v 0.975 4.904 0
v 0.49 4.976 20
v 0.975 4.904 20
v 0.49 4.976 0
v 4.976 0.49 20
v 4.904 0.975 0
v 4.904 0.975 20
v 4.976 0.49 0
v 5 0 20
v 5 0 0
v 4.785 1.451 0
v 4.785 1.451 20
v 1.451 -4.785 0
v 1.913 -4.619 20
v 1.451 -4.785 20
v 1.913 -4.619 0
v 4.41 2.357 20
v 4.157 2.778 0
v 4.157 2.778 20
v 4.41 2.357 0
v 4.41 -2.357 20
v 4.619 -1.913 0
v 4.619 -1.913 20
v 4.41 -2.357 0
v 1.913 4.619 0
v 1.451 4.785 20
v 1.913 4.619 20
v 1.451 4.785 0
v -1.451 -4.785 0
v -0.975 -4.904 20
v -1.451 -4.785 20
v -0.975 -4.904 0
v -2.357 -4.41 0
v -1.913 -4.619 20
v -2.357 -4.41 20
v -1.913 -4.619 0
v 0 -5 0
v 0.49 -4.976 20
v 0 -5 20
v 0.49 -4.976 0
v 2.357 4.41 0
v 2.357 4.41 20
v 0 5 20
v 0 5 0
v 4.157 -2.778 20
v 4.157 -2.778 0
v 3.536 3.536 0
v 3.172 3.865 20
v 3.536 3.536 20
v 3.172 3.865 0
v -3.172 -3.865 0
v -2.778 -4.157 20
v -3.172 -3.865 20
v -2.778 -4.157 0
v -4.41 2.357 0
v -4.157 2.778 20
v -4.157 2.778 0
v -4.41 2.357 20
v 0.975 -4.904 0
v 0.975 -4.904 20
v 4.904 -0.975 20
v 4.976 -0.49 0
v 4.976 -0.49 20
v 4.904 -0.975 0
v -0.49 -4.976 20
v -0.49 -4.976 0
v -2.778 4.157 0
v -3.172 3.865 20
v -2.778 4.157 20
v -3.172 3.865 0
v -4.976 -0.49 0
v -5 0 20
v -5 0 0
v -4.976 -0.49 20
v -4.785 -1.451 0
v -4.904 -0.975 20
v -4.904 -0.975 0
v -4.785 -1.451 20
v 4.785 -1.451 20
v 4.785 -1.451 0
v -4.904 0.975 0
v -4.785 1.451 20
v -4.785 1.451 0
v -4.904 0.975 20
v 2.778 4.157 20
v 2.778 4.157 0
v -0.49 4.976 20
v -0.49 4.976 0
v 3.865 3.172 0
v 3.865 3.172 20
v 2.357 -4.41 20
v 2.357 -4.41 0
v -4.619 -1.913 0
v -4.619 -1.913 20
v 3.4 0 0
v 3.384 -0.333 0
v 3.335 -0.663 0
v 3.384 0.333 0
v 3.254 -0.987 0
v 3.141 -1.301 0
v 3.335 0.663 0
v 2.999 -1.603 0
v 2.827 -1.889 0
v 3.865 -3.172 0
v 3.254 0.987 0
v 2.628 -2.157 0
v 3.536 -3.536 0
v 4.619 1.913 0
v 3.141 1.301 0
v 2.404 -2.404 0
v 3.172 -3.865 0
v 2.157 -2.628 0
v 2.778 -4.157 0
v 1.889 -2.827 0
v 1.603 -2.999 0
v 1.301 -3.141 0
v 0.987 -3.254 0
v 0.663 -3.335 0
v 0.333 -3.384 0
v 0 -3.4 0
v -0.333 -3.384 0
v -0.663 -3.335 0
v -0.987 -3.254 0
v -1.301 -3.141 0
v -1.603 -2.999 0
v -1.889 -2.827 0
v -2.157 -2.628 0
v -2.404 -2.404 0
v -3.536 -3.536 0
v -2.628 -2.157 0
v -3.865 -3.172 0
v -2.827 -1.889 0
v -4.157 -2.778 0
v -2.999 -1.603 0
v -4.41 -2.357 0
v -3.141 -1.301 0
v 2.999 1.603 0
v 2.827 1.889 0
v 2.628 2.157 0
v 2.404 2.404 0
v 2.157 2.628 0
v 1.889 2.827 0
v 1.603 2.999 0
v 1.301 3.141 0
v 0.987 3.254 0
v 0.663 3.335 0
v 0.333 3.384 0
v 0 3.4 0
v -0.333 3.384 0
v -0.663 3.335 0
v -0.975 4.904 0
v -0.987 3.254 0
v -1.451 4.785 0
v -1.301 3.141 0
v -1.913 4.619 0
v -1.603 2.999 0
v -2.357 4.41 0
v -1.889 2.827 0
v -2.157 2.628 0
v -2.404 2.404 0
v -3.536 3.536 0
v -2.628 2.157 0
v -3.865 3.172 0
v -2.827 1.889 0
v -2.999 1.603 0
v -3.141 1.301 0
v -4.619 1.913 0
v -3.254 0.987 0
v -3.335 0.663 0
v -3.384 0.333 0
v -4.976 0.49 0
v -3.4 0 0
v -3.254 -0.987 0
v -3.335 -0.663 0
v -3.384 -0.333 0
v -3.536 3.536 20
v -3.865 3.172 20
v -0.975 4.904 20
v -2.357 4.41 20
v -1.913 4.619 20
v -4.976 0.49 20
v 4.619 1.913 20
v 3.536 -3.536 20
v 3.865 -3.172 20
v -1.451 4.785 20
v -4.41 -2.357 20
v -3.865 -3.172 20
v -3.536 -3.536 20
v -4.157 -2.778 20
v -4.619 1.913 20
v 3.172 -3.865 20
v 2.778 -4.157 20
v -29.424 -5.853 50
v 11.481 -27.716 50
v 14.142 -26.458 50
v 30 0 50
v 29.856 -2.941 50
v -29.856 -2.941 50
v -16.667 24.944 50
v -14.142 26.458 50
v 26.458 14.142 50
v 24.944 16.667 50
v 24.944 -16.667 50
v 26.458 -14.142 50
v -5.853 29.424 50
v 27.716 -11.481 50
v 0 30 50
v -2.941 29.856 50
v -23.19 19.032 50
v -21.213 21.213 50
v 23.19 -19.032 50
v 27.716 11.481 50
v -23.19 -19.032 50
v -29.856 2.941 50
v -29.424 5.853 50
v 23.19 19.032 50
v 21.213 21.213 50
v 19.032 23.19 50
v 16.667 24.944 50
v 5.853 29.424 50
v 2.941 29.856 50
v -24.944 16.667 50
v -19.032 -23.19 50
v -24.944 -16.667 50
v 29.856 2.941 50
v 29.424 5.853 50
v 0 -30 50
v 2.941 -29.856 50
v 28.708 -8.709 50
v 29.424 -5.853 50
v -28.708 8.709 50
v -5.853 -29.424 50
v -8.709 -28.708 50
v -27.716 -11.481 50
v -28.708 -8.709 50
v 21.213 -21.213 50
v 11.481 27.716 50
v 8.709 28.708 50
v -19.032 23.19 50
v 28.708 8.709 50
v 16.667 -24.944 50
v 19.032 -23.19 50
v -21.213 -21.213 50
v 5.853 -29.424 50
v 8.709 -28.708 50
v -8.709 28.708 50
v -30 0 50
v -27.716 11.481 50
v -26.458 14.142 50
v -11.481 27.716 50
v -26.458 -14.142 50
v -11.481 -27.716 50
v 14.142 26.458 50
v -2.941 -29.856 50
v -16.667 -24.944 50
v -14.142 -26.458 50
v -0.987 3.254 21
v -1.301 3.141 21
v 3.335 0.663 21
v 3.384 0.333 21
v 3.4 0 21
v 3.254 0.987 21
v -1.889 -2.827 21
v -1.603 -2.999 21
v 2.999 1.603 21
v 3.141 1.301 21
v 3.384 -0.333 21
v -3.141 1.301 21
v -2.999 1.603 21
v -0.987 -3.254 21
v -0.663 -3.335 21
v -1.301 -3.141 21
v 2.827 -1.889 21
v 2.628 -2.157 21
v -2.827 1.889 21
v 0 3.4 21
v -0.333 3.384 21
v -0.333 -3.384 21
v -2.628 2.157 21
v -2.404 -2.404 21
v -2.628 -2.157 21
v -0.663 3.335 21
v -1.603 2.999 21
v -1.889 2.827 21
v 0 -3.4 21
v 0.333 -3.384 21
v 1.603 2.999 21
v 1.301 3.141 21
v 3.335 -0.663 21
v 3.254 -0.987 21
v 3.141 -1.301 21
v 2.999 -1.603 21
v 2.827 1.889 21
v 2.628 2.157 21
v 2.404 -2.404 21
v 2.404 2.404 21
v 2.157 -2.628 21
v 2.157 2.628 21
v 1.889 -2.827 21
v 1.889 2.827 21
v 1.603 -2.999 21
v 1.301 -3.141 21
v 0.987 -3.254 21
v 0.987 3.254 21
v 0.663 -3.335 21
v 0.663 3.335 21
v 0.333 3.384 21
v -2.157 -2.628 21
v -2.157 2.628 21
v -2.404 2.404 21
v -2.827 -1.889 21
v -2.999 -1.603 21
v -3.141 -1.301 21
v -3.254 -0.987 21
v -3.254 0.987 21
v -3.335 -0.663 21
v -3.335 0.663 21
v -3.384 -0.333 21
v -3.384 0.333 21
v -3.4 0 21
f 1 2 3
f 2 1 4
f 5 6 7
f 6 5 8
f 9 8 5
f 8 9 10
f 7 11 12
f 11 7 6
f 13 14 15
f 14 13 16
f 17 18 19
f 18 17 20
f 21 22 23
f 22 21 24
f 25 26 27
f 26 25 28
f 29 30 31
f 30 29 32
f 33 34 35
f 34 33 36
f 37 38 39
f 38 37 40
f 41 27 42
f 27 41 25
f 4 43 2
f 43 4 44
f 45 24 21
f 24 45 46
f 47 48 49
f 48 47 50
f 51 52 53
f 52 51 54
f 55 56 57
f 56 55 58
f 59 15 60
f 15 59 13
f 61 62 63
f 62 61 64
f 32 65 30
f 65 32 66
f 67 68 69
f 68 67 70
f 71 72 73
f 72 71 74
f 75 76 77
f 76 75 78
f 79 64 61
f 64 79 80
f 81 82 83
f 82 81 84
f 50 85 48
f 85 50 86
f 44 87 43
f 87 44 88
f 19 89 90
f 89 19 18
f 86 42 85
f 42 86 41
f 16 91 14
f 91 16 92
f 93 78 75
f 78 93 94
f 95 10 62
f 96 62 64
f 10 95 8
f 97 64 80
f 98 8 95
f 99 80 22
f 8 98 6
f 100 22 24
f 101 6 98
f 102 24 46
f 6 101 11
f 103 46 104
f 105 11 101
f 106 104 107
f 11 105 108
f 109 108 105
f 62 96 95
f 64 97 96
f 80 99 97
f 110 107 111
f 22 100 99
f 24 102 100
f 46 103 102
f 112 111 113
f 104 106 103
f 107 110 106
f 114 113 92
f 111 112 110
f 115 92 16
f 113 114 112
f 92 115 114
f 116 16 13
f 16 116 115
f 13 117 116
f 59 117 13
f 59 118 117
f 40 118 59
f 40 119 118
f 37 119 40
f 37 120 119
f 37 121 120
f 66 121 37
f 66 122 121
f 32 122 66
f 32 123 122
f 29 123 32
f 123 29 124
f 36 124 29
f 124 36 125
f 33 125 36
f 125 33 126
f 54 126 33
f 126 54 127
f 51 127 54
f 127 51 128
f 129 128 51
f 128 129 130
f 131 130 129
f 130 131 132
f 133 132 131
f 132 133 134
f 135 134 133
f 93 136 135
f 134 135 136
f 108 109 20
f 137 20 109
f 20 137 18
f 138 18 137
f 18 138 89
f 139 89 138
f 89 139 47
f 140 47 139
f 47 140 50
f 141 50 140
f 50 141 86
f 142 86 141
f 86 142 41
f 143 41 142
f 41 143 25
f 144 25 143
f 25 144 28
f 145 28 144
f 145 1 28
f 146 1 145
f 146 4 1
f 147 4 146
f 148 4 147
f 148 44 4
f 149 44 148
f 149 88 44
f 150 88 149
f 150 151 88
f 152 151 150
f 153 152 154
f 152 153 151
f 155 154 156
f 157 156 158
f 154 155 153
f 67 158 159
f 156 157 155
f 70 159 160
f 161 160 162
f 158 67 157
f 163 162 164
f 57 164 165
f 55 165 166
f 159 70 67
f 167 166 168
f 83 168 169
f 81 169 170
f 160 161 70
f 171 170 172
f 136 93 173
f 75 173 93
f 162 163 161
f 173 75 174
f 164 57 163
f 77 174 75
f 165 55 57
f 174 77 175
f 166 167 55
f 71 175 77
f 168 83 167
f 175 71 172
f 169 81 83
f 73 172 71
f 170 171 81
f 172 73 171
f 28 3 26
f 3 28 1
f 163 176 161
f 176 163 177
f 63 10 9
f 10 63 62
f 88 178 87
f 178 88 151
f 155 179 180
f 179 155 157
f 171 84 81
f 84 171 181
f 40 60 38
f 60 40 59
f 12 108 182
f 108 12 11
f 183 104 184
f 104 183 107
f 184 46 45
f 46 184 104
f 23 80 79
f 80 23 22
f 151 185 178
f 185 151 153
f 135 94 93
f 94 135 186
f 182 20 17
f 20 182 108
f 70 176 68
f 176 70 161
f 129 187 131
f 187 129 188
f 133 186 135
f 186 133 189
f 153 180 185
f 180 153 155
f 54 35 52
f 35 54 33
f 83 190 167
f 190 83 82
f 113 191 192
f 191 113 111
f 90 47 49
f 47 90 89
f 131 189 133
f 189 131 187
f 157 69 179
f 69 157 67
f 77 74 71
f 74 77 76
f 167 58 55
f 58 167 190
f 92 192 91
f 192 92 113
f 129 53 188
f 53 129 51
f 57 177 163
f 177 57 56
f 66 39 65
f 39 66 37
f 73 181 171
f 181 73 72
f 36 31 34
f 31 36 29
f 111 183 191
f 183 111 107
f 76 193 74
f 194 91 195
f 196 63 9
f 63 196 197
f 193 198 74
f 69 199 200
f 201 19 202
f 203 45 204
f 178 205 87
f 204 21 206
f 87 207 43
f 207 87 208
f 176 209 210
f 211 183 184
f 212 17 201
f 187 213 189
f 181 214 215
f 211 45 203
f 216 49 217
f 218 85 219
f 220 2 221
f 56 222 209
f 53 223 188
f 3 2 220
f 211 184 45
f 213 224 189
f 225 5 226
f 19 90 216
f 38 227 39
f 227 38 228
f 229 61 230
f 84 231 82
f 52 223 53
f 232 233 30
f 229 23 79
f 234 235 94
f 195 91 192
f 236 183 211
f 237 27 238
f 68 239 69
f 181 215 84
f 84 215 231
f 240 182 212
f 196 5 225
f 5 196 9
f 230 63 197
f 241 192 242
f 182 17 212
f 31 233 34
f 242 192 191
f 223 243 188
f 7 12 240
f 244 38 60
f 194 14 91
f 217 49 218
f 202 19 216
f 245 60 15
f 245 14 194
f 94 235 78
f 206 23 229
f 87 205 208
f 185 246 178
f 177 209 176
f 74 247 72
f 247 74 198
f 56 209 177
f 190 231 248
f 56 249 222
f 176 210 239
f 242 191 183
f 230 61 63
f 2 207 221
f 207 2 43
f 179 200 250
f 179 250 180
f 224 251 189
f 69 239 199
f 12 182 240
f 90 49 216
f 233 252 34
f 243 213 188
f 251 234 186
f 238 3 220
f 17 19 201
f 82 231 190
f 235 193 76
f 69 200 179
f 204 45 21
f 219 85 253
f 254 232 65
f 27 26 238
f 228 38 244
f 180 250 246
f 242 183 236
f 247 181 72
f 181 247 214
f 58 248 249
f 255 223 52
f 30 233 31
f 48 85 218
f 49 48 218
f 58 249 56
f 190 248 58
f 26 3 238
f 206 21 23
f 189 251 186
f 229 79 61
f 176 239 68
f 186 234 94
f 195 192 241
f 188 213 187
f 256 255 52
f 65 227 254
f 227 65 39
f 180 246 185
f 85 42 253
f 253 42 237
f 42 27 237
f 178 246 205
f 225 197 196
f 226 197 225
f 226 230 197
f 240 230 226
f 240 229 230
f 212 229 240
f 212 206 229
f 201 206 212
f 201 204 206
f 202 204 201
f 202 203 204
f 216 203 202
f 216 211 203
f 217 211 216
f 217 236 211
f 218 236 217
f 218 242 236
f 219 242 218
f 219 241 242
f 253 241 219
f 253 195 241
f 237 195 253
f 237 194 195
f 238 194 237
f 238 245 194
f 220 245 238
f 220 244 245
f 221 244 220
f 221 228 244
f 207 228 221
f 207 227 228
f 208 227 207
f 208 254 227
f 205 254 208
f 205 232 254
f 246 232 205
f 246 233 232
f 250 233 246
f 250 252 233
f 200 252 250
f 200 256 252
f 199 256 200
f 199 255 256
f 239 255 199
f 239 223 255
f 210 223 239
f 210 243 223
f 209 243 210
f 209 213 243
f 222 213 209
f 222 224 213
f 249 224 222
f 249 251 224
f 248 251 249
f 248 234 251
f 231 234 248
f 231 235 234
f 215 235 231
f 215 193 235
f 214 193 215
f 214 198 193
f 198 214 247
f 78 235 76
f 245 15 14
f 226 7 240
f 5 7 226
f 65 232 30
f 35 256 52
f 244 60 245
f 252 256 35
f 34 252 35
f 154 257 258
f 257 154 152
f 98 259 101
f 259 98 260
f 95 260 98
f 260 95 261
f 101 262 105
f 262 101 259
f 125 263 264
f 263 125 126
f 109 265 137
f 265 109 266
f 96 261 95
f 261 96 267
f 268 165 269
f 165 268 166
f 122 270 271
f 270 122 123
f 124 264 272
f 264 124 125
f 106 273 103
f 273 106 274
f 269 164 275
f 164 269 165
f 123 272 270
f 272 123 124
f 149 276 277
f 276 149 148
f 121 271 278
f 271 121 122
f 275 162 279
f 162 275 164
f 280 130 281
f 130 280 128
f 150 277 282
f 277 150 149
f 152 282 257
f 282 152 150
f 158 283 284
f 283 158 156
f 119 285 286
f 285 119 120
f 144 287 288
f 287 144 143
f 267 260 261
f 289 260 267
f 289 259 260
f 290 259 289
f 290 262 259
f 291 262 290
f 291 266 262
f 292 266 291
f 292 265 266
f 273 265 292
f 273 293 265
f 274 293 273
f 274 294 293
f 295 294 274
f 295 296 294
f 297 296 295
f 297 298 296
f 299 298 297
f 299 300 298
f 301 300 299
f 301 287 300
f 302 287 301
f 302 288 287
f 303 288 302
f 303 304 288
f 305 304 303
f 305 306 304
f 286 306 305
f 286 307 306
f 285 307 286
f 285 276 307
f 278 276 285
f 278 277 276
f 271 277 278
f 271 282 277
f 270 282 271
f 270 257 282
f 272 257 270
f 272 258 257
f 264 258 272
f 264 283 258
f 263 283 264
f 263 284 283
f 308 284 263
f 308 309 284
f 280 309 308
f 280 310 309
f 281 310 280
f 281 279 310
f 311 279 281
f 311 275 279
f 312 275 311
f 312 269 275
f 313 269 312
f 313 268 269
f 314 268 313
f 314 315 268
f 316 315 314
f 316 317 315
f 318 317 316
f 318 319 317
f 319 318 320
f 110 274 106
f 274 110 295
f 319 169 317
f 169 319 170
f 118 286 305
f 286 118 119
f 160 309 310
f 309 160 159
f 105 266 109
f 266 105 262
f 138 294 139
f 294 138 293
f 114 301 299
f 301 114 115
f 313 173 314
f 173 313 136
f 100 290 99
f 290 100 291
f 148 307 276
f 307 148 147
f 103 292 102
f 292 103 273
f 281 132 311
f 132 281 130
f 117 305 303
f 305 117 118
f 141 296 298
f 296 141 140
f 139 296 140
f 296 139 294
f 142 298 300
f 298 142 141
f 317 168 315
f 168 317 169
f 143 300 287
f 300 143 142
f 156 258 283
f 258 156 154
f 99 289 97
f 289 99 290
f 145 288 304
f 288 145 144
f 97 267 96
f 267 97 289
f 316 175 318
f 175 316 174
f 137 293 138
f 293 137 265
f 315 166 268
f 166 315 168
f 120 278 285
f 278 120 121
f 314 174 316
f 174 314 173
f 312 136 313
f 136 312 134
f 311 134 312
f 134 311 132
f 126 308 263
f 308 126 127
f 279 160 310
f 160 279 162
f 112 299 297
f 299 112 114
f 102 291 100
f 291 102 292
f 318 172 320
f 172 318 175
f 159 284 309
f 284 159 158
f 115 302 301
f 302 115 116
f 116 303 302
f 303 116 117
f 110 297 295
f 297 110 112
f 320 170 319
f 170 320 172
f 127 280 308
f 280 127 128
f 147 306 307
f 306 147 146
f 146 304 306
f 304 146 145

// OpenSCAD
// Funnel - a straight spout (tube) with a conical bowl, open at both ends, for pouring
// liquids in the lab. NOVEL general part.
//

spout_d = 10;
spout_l = 20;
cone_d  = 60;
rim     = 50;
wall    = 1.6;

$fn = 64;

ib = spout_d - 2 * wall;   // bore of the spout

difference() {
    union() {
        cylinder(h = spout_l, d = spout_d);          // spout
        translate([0, 0, spout_l]) cylinder(h = 30, d1 = spout_d, d2 = cone_d);  // cone (flared end)
        translate([0, 0, spout_l]) cylinder(h = 30, d1 = ib, d2 = cone_d - 2 * wall);  // inner cone, open mouth
    }
    translate([0, 0, -1]) cylinder(h = spout_l + 2, d = ib);  // bore through the spout
}
